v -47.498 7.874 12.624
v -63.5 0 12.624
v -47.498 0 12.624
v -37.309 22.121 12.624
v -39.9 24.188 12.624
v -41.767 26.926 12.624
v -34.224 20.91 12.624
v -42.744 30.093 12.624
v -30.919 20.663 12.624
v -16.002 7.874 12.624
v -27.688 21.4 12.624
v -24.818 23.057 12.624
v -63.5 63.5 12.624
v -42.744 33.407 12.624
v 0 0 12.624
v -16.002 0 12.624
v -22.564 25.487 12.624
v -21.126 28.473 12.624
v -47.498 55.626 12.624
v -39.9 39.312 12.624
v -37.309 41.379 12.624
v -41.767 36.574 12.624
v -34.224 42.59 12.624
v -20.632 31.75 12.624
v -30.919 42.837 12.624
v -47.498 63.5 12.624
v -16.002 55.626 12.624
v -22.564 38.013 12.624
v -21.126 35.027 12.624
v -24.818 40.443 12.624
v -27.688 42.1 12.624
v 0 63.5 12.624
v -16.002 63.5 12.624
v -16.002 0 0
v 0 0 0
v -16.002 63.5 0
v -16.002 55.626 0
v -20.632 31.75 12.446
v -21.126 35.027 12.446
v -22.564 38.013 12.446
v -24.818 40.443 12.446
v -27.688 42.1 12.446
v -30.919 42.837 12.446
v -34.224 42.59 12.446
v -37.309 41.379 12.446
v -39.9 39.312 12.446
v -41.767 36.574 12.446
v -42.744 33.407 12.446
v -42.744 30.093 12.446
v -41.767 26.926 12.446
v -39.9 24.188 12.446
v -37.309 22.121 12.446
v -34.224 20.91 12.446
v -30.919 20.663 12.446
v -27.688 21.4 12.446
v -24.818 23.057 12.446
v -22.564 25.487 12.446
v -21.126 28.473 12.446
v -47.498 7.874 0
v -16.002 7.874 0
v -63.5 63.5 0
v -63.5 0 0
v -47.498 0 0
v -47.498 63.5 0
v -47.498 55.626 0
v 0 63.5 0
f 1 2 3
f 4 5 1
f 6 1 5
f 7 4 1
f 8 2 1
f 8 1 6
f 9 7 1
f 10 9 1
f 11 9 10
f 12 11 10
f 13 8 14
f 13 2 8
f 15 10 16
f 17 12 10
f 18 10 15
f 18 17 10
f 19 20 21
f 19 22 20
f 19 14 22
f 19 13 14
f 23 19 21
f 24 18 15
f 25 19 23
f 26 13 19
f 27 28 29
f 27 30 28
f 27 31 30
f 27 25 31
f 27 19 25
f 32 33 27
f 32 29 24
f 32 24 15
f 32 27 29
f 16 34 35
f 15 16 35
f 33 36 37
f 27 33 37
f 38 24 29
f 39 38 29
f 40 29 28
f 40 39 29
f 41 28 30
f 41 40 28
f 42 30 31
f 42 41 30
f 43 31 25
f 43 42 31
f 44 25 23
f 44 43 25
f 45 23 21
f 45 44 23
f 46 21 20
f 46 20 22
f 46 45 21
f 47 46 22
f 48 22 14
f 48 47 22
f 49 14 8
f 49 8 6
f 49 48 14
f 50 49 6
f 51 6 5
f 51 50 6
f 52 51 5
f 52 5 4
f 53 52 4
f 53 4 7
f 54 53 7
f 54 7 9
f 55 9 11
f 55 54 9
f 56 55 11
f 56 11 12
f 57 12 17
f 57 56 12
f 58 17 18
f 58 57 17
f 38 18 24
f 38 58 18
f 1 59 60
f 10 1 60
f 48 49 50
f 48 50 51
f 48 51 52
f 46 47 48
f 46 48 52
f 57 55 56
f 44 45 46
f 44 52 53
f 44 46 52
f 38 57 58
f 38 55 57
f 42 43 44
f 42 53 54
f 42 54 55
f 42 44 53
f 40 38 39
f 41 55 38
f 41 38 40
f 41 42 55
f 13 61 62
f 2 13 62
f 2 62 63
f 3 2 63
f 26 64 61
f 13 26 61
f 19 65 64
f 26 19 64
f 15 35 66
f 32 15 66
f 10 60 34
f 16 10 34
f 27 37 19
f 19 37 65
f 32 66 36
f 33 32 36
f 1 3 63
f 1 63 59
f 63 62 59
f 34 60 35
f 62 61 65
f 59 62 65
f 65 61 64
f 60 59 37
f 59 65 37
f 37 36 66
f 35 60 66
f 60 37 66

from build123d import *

# Parameters (mm, degrees)
F0_R     = 11.1183318615
F1_DEPTH = 25.4
F2_DEPTH = 12.7
F3_DEPTH = 12.7
F4_DEPTH = 12.7762
F5_DEPTH = 0.508
F6_DEPTH = 11.938


with BuildPart() as f1:
    # F0 (on Top) → F1 (new body)
    with BuildSketch(Plane.XY):
        Polygon((-47.498, 63.5), (-63.5, 63.5), (-63.5, 0), (-47.498, 0), (-47.498, 7.874), (-16.002, 7.874), (-16.002, 0), (0, 0), (0, 63.5), (-16.002, 63.5), (-16.002, 55.626), (-47.498, 55.626), align=None)
        with Locations((-31.75, 31.75)):
            Circle(F0_R, mode=Mode.SUBTRACT)
    extrude(amount=F1_DEPTH)

    # F2 (add): a face of the model
    f2_faces = [f1.faces().sort_by_distance(p)[0] for p in [
        (-55.499, 62.6019743879, 25.4),
    ]]
    extrude(f2_faces, amount=F2_DEPTH)

    # F3 (cut): a face of the model
    f3_faces = [f1.faces().sort_by_distance(p)[0] for p in [
        (-55.499, 62.6019743879, 38.1),
    ]]
    extrude(f3_faces, amount=-F3_DEPTH, mode=Mode.SUBTRACT)

    # F4 (cut): a face of the model
    f4_faces = [f1.faces().sort_by_distance(p)[0] for p in [
        (-55.499, 62.6019743879, 25.4),
    ]]
    extrude(f4_faces, amount=-F4_DEPTH, mode=Mode.SUBTRACT)

    # F0 (on Top) → F5 (join)
    with BuildSketch(Plane.XY):
        with Locations((-31.75, 31.75)):
            Circle(F0_R)
    extrude(amount=F5_DEPTH)

    # F6 (add): a face of the model
    f6_faces = [f1.faces().sort_by_distance(p)[0] for p in [
        (-31.75, 31.75, 0.508),
    ]]
    extrude(f6_faces, amount=F6_DEPTH)


solid = f1.part
